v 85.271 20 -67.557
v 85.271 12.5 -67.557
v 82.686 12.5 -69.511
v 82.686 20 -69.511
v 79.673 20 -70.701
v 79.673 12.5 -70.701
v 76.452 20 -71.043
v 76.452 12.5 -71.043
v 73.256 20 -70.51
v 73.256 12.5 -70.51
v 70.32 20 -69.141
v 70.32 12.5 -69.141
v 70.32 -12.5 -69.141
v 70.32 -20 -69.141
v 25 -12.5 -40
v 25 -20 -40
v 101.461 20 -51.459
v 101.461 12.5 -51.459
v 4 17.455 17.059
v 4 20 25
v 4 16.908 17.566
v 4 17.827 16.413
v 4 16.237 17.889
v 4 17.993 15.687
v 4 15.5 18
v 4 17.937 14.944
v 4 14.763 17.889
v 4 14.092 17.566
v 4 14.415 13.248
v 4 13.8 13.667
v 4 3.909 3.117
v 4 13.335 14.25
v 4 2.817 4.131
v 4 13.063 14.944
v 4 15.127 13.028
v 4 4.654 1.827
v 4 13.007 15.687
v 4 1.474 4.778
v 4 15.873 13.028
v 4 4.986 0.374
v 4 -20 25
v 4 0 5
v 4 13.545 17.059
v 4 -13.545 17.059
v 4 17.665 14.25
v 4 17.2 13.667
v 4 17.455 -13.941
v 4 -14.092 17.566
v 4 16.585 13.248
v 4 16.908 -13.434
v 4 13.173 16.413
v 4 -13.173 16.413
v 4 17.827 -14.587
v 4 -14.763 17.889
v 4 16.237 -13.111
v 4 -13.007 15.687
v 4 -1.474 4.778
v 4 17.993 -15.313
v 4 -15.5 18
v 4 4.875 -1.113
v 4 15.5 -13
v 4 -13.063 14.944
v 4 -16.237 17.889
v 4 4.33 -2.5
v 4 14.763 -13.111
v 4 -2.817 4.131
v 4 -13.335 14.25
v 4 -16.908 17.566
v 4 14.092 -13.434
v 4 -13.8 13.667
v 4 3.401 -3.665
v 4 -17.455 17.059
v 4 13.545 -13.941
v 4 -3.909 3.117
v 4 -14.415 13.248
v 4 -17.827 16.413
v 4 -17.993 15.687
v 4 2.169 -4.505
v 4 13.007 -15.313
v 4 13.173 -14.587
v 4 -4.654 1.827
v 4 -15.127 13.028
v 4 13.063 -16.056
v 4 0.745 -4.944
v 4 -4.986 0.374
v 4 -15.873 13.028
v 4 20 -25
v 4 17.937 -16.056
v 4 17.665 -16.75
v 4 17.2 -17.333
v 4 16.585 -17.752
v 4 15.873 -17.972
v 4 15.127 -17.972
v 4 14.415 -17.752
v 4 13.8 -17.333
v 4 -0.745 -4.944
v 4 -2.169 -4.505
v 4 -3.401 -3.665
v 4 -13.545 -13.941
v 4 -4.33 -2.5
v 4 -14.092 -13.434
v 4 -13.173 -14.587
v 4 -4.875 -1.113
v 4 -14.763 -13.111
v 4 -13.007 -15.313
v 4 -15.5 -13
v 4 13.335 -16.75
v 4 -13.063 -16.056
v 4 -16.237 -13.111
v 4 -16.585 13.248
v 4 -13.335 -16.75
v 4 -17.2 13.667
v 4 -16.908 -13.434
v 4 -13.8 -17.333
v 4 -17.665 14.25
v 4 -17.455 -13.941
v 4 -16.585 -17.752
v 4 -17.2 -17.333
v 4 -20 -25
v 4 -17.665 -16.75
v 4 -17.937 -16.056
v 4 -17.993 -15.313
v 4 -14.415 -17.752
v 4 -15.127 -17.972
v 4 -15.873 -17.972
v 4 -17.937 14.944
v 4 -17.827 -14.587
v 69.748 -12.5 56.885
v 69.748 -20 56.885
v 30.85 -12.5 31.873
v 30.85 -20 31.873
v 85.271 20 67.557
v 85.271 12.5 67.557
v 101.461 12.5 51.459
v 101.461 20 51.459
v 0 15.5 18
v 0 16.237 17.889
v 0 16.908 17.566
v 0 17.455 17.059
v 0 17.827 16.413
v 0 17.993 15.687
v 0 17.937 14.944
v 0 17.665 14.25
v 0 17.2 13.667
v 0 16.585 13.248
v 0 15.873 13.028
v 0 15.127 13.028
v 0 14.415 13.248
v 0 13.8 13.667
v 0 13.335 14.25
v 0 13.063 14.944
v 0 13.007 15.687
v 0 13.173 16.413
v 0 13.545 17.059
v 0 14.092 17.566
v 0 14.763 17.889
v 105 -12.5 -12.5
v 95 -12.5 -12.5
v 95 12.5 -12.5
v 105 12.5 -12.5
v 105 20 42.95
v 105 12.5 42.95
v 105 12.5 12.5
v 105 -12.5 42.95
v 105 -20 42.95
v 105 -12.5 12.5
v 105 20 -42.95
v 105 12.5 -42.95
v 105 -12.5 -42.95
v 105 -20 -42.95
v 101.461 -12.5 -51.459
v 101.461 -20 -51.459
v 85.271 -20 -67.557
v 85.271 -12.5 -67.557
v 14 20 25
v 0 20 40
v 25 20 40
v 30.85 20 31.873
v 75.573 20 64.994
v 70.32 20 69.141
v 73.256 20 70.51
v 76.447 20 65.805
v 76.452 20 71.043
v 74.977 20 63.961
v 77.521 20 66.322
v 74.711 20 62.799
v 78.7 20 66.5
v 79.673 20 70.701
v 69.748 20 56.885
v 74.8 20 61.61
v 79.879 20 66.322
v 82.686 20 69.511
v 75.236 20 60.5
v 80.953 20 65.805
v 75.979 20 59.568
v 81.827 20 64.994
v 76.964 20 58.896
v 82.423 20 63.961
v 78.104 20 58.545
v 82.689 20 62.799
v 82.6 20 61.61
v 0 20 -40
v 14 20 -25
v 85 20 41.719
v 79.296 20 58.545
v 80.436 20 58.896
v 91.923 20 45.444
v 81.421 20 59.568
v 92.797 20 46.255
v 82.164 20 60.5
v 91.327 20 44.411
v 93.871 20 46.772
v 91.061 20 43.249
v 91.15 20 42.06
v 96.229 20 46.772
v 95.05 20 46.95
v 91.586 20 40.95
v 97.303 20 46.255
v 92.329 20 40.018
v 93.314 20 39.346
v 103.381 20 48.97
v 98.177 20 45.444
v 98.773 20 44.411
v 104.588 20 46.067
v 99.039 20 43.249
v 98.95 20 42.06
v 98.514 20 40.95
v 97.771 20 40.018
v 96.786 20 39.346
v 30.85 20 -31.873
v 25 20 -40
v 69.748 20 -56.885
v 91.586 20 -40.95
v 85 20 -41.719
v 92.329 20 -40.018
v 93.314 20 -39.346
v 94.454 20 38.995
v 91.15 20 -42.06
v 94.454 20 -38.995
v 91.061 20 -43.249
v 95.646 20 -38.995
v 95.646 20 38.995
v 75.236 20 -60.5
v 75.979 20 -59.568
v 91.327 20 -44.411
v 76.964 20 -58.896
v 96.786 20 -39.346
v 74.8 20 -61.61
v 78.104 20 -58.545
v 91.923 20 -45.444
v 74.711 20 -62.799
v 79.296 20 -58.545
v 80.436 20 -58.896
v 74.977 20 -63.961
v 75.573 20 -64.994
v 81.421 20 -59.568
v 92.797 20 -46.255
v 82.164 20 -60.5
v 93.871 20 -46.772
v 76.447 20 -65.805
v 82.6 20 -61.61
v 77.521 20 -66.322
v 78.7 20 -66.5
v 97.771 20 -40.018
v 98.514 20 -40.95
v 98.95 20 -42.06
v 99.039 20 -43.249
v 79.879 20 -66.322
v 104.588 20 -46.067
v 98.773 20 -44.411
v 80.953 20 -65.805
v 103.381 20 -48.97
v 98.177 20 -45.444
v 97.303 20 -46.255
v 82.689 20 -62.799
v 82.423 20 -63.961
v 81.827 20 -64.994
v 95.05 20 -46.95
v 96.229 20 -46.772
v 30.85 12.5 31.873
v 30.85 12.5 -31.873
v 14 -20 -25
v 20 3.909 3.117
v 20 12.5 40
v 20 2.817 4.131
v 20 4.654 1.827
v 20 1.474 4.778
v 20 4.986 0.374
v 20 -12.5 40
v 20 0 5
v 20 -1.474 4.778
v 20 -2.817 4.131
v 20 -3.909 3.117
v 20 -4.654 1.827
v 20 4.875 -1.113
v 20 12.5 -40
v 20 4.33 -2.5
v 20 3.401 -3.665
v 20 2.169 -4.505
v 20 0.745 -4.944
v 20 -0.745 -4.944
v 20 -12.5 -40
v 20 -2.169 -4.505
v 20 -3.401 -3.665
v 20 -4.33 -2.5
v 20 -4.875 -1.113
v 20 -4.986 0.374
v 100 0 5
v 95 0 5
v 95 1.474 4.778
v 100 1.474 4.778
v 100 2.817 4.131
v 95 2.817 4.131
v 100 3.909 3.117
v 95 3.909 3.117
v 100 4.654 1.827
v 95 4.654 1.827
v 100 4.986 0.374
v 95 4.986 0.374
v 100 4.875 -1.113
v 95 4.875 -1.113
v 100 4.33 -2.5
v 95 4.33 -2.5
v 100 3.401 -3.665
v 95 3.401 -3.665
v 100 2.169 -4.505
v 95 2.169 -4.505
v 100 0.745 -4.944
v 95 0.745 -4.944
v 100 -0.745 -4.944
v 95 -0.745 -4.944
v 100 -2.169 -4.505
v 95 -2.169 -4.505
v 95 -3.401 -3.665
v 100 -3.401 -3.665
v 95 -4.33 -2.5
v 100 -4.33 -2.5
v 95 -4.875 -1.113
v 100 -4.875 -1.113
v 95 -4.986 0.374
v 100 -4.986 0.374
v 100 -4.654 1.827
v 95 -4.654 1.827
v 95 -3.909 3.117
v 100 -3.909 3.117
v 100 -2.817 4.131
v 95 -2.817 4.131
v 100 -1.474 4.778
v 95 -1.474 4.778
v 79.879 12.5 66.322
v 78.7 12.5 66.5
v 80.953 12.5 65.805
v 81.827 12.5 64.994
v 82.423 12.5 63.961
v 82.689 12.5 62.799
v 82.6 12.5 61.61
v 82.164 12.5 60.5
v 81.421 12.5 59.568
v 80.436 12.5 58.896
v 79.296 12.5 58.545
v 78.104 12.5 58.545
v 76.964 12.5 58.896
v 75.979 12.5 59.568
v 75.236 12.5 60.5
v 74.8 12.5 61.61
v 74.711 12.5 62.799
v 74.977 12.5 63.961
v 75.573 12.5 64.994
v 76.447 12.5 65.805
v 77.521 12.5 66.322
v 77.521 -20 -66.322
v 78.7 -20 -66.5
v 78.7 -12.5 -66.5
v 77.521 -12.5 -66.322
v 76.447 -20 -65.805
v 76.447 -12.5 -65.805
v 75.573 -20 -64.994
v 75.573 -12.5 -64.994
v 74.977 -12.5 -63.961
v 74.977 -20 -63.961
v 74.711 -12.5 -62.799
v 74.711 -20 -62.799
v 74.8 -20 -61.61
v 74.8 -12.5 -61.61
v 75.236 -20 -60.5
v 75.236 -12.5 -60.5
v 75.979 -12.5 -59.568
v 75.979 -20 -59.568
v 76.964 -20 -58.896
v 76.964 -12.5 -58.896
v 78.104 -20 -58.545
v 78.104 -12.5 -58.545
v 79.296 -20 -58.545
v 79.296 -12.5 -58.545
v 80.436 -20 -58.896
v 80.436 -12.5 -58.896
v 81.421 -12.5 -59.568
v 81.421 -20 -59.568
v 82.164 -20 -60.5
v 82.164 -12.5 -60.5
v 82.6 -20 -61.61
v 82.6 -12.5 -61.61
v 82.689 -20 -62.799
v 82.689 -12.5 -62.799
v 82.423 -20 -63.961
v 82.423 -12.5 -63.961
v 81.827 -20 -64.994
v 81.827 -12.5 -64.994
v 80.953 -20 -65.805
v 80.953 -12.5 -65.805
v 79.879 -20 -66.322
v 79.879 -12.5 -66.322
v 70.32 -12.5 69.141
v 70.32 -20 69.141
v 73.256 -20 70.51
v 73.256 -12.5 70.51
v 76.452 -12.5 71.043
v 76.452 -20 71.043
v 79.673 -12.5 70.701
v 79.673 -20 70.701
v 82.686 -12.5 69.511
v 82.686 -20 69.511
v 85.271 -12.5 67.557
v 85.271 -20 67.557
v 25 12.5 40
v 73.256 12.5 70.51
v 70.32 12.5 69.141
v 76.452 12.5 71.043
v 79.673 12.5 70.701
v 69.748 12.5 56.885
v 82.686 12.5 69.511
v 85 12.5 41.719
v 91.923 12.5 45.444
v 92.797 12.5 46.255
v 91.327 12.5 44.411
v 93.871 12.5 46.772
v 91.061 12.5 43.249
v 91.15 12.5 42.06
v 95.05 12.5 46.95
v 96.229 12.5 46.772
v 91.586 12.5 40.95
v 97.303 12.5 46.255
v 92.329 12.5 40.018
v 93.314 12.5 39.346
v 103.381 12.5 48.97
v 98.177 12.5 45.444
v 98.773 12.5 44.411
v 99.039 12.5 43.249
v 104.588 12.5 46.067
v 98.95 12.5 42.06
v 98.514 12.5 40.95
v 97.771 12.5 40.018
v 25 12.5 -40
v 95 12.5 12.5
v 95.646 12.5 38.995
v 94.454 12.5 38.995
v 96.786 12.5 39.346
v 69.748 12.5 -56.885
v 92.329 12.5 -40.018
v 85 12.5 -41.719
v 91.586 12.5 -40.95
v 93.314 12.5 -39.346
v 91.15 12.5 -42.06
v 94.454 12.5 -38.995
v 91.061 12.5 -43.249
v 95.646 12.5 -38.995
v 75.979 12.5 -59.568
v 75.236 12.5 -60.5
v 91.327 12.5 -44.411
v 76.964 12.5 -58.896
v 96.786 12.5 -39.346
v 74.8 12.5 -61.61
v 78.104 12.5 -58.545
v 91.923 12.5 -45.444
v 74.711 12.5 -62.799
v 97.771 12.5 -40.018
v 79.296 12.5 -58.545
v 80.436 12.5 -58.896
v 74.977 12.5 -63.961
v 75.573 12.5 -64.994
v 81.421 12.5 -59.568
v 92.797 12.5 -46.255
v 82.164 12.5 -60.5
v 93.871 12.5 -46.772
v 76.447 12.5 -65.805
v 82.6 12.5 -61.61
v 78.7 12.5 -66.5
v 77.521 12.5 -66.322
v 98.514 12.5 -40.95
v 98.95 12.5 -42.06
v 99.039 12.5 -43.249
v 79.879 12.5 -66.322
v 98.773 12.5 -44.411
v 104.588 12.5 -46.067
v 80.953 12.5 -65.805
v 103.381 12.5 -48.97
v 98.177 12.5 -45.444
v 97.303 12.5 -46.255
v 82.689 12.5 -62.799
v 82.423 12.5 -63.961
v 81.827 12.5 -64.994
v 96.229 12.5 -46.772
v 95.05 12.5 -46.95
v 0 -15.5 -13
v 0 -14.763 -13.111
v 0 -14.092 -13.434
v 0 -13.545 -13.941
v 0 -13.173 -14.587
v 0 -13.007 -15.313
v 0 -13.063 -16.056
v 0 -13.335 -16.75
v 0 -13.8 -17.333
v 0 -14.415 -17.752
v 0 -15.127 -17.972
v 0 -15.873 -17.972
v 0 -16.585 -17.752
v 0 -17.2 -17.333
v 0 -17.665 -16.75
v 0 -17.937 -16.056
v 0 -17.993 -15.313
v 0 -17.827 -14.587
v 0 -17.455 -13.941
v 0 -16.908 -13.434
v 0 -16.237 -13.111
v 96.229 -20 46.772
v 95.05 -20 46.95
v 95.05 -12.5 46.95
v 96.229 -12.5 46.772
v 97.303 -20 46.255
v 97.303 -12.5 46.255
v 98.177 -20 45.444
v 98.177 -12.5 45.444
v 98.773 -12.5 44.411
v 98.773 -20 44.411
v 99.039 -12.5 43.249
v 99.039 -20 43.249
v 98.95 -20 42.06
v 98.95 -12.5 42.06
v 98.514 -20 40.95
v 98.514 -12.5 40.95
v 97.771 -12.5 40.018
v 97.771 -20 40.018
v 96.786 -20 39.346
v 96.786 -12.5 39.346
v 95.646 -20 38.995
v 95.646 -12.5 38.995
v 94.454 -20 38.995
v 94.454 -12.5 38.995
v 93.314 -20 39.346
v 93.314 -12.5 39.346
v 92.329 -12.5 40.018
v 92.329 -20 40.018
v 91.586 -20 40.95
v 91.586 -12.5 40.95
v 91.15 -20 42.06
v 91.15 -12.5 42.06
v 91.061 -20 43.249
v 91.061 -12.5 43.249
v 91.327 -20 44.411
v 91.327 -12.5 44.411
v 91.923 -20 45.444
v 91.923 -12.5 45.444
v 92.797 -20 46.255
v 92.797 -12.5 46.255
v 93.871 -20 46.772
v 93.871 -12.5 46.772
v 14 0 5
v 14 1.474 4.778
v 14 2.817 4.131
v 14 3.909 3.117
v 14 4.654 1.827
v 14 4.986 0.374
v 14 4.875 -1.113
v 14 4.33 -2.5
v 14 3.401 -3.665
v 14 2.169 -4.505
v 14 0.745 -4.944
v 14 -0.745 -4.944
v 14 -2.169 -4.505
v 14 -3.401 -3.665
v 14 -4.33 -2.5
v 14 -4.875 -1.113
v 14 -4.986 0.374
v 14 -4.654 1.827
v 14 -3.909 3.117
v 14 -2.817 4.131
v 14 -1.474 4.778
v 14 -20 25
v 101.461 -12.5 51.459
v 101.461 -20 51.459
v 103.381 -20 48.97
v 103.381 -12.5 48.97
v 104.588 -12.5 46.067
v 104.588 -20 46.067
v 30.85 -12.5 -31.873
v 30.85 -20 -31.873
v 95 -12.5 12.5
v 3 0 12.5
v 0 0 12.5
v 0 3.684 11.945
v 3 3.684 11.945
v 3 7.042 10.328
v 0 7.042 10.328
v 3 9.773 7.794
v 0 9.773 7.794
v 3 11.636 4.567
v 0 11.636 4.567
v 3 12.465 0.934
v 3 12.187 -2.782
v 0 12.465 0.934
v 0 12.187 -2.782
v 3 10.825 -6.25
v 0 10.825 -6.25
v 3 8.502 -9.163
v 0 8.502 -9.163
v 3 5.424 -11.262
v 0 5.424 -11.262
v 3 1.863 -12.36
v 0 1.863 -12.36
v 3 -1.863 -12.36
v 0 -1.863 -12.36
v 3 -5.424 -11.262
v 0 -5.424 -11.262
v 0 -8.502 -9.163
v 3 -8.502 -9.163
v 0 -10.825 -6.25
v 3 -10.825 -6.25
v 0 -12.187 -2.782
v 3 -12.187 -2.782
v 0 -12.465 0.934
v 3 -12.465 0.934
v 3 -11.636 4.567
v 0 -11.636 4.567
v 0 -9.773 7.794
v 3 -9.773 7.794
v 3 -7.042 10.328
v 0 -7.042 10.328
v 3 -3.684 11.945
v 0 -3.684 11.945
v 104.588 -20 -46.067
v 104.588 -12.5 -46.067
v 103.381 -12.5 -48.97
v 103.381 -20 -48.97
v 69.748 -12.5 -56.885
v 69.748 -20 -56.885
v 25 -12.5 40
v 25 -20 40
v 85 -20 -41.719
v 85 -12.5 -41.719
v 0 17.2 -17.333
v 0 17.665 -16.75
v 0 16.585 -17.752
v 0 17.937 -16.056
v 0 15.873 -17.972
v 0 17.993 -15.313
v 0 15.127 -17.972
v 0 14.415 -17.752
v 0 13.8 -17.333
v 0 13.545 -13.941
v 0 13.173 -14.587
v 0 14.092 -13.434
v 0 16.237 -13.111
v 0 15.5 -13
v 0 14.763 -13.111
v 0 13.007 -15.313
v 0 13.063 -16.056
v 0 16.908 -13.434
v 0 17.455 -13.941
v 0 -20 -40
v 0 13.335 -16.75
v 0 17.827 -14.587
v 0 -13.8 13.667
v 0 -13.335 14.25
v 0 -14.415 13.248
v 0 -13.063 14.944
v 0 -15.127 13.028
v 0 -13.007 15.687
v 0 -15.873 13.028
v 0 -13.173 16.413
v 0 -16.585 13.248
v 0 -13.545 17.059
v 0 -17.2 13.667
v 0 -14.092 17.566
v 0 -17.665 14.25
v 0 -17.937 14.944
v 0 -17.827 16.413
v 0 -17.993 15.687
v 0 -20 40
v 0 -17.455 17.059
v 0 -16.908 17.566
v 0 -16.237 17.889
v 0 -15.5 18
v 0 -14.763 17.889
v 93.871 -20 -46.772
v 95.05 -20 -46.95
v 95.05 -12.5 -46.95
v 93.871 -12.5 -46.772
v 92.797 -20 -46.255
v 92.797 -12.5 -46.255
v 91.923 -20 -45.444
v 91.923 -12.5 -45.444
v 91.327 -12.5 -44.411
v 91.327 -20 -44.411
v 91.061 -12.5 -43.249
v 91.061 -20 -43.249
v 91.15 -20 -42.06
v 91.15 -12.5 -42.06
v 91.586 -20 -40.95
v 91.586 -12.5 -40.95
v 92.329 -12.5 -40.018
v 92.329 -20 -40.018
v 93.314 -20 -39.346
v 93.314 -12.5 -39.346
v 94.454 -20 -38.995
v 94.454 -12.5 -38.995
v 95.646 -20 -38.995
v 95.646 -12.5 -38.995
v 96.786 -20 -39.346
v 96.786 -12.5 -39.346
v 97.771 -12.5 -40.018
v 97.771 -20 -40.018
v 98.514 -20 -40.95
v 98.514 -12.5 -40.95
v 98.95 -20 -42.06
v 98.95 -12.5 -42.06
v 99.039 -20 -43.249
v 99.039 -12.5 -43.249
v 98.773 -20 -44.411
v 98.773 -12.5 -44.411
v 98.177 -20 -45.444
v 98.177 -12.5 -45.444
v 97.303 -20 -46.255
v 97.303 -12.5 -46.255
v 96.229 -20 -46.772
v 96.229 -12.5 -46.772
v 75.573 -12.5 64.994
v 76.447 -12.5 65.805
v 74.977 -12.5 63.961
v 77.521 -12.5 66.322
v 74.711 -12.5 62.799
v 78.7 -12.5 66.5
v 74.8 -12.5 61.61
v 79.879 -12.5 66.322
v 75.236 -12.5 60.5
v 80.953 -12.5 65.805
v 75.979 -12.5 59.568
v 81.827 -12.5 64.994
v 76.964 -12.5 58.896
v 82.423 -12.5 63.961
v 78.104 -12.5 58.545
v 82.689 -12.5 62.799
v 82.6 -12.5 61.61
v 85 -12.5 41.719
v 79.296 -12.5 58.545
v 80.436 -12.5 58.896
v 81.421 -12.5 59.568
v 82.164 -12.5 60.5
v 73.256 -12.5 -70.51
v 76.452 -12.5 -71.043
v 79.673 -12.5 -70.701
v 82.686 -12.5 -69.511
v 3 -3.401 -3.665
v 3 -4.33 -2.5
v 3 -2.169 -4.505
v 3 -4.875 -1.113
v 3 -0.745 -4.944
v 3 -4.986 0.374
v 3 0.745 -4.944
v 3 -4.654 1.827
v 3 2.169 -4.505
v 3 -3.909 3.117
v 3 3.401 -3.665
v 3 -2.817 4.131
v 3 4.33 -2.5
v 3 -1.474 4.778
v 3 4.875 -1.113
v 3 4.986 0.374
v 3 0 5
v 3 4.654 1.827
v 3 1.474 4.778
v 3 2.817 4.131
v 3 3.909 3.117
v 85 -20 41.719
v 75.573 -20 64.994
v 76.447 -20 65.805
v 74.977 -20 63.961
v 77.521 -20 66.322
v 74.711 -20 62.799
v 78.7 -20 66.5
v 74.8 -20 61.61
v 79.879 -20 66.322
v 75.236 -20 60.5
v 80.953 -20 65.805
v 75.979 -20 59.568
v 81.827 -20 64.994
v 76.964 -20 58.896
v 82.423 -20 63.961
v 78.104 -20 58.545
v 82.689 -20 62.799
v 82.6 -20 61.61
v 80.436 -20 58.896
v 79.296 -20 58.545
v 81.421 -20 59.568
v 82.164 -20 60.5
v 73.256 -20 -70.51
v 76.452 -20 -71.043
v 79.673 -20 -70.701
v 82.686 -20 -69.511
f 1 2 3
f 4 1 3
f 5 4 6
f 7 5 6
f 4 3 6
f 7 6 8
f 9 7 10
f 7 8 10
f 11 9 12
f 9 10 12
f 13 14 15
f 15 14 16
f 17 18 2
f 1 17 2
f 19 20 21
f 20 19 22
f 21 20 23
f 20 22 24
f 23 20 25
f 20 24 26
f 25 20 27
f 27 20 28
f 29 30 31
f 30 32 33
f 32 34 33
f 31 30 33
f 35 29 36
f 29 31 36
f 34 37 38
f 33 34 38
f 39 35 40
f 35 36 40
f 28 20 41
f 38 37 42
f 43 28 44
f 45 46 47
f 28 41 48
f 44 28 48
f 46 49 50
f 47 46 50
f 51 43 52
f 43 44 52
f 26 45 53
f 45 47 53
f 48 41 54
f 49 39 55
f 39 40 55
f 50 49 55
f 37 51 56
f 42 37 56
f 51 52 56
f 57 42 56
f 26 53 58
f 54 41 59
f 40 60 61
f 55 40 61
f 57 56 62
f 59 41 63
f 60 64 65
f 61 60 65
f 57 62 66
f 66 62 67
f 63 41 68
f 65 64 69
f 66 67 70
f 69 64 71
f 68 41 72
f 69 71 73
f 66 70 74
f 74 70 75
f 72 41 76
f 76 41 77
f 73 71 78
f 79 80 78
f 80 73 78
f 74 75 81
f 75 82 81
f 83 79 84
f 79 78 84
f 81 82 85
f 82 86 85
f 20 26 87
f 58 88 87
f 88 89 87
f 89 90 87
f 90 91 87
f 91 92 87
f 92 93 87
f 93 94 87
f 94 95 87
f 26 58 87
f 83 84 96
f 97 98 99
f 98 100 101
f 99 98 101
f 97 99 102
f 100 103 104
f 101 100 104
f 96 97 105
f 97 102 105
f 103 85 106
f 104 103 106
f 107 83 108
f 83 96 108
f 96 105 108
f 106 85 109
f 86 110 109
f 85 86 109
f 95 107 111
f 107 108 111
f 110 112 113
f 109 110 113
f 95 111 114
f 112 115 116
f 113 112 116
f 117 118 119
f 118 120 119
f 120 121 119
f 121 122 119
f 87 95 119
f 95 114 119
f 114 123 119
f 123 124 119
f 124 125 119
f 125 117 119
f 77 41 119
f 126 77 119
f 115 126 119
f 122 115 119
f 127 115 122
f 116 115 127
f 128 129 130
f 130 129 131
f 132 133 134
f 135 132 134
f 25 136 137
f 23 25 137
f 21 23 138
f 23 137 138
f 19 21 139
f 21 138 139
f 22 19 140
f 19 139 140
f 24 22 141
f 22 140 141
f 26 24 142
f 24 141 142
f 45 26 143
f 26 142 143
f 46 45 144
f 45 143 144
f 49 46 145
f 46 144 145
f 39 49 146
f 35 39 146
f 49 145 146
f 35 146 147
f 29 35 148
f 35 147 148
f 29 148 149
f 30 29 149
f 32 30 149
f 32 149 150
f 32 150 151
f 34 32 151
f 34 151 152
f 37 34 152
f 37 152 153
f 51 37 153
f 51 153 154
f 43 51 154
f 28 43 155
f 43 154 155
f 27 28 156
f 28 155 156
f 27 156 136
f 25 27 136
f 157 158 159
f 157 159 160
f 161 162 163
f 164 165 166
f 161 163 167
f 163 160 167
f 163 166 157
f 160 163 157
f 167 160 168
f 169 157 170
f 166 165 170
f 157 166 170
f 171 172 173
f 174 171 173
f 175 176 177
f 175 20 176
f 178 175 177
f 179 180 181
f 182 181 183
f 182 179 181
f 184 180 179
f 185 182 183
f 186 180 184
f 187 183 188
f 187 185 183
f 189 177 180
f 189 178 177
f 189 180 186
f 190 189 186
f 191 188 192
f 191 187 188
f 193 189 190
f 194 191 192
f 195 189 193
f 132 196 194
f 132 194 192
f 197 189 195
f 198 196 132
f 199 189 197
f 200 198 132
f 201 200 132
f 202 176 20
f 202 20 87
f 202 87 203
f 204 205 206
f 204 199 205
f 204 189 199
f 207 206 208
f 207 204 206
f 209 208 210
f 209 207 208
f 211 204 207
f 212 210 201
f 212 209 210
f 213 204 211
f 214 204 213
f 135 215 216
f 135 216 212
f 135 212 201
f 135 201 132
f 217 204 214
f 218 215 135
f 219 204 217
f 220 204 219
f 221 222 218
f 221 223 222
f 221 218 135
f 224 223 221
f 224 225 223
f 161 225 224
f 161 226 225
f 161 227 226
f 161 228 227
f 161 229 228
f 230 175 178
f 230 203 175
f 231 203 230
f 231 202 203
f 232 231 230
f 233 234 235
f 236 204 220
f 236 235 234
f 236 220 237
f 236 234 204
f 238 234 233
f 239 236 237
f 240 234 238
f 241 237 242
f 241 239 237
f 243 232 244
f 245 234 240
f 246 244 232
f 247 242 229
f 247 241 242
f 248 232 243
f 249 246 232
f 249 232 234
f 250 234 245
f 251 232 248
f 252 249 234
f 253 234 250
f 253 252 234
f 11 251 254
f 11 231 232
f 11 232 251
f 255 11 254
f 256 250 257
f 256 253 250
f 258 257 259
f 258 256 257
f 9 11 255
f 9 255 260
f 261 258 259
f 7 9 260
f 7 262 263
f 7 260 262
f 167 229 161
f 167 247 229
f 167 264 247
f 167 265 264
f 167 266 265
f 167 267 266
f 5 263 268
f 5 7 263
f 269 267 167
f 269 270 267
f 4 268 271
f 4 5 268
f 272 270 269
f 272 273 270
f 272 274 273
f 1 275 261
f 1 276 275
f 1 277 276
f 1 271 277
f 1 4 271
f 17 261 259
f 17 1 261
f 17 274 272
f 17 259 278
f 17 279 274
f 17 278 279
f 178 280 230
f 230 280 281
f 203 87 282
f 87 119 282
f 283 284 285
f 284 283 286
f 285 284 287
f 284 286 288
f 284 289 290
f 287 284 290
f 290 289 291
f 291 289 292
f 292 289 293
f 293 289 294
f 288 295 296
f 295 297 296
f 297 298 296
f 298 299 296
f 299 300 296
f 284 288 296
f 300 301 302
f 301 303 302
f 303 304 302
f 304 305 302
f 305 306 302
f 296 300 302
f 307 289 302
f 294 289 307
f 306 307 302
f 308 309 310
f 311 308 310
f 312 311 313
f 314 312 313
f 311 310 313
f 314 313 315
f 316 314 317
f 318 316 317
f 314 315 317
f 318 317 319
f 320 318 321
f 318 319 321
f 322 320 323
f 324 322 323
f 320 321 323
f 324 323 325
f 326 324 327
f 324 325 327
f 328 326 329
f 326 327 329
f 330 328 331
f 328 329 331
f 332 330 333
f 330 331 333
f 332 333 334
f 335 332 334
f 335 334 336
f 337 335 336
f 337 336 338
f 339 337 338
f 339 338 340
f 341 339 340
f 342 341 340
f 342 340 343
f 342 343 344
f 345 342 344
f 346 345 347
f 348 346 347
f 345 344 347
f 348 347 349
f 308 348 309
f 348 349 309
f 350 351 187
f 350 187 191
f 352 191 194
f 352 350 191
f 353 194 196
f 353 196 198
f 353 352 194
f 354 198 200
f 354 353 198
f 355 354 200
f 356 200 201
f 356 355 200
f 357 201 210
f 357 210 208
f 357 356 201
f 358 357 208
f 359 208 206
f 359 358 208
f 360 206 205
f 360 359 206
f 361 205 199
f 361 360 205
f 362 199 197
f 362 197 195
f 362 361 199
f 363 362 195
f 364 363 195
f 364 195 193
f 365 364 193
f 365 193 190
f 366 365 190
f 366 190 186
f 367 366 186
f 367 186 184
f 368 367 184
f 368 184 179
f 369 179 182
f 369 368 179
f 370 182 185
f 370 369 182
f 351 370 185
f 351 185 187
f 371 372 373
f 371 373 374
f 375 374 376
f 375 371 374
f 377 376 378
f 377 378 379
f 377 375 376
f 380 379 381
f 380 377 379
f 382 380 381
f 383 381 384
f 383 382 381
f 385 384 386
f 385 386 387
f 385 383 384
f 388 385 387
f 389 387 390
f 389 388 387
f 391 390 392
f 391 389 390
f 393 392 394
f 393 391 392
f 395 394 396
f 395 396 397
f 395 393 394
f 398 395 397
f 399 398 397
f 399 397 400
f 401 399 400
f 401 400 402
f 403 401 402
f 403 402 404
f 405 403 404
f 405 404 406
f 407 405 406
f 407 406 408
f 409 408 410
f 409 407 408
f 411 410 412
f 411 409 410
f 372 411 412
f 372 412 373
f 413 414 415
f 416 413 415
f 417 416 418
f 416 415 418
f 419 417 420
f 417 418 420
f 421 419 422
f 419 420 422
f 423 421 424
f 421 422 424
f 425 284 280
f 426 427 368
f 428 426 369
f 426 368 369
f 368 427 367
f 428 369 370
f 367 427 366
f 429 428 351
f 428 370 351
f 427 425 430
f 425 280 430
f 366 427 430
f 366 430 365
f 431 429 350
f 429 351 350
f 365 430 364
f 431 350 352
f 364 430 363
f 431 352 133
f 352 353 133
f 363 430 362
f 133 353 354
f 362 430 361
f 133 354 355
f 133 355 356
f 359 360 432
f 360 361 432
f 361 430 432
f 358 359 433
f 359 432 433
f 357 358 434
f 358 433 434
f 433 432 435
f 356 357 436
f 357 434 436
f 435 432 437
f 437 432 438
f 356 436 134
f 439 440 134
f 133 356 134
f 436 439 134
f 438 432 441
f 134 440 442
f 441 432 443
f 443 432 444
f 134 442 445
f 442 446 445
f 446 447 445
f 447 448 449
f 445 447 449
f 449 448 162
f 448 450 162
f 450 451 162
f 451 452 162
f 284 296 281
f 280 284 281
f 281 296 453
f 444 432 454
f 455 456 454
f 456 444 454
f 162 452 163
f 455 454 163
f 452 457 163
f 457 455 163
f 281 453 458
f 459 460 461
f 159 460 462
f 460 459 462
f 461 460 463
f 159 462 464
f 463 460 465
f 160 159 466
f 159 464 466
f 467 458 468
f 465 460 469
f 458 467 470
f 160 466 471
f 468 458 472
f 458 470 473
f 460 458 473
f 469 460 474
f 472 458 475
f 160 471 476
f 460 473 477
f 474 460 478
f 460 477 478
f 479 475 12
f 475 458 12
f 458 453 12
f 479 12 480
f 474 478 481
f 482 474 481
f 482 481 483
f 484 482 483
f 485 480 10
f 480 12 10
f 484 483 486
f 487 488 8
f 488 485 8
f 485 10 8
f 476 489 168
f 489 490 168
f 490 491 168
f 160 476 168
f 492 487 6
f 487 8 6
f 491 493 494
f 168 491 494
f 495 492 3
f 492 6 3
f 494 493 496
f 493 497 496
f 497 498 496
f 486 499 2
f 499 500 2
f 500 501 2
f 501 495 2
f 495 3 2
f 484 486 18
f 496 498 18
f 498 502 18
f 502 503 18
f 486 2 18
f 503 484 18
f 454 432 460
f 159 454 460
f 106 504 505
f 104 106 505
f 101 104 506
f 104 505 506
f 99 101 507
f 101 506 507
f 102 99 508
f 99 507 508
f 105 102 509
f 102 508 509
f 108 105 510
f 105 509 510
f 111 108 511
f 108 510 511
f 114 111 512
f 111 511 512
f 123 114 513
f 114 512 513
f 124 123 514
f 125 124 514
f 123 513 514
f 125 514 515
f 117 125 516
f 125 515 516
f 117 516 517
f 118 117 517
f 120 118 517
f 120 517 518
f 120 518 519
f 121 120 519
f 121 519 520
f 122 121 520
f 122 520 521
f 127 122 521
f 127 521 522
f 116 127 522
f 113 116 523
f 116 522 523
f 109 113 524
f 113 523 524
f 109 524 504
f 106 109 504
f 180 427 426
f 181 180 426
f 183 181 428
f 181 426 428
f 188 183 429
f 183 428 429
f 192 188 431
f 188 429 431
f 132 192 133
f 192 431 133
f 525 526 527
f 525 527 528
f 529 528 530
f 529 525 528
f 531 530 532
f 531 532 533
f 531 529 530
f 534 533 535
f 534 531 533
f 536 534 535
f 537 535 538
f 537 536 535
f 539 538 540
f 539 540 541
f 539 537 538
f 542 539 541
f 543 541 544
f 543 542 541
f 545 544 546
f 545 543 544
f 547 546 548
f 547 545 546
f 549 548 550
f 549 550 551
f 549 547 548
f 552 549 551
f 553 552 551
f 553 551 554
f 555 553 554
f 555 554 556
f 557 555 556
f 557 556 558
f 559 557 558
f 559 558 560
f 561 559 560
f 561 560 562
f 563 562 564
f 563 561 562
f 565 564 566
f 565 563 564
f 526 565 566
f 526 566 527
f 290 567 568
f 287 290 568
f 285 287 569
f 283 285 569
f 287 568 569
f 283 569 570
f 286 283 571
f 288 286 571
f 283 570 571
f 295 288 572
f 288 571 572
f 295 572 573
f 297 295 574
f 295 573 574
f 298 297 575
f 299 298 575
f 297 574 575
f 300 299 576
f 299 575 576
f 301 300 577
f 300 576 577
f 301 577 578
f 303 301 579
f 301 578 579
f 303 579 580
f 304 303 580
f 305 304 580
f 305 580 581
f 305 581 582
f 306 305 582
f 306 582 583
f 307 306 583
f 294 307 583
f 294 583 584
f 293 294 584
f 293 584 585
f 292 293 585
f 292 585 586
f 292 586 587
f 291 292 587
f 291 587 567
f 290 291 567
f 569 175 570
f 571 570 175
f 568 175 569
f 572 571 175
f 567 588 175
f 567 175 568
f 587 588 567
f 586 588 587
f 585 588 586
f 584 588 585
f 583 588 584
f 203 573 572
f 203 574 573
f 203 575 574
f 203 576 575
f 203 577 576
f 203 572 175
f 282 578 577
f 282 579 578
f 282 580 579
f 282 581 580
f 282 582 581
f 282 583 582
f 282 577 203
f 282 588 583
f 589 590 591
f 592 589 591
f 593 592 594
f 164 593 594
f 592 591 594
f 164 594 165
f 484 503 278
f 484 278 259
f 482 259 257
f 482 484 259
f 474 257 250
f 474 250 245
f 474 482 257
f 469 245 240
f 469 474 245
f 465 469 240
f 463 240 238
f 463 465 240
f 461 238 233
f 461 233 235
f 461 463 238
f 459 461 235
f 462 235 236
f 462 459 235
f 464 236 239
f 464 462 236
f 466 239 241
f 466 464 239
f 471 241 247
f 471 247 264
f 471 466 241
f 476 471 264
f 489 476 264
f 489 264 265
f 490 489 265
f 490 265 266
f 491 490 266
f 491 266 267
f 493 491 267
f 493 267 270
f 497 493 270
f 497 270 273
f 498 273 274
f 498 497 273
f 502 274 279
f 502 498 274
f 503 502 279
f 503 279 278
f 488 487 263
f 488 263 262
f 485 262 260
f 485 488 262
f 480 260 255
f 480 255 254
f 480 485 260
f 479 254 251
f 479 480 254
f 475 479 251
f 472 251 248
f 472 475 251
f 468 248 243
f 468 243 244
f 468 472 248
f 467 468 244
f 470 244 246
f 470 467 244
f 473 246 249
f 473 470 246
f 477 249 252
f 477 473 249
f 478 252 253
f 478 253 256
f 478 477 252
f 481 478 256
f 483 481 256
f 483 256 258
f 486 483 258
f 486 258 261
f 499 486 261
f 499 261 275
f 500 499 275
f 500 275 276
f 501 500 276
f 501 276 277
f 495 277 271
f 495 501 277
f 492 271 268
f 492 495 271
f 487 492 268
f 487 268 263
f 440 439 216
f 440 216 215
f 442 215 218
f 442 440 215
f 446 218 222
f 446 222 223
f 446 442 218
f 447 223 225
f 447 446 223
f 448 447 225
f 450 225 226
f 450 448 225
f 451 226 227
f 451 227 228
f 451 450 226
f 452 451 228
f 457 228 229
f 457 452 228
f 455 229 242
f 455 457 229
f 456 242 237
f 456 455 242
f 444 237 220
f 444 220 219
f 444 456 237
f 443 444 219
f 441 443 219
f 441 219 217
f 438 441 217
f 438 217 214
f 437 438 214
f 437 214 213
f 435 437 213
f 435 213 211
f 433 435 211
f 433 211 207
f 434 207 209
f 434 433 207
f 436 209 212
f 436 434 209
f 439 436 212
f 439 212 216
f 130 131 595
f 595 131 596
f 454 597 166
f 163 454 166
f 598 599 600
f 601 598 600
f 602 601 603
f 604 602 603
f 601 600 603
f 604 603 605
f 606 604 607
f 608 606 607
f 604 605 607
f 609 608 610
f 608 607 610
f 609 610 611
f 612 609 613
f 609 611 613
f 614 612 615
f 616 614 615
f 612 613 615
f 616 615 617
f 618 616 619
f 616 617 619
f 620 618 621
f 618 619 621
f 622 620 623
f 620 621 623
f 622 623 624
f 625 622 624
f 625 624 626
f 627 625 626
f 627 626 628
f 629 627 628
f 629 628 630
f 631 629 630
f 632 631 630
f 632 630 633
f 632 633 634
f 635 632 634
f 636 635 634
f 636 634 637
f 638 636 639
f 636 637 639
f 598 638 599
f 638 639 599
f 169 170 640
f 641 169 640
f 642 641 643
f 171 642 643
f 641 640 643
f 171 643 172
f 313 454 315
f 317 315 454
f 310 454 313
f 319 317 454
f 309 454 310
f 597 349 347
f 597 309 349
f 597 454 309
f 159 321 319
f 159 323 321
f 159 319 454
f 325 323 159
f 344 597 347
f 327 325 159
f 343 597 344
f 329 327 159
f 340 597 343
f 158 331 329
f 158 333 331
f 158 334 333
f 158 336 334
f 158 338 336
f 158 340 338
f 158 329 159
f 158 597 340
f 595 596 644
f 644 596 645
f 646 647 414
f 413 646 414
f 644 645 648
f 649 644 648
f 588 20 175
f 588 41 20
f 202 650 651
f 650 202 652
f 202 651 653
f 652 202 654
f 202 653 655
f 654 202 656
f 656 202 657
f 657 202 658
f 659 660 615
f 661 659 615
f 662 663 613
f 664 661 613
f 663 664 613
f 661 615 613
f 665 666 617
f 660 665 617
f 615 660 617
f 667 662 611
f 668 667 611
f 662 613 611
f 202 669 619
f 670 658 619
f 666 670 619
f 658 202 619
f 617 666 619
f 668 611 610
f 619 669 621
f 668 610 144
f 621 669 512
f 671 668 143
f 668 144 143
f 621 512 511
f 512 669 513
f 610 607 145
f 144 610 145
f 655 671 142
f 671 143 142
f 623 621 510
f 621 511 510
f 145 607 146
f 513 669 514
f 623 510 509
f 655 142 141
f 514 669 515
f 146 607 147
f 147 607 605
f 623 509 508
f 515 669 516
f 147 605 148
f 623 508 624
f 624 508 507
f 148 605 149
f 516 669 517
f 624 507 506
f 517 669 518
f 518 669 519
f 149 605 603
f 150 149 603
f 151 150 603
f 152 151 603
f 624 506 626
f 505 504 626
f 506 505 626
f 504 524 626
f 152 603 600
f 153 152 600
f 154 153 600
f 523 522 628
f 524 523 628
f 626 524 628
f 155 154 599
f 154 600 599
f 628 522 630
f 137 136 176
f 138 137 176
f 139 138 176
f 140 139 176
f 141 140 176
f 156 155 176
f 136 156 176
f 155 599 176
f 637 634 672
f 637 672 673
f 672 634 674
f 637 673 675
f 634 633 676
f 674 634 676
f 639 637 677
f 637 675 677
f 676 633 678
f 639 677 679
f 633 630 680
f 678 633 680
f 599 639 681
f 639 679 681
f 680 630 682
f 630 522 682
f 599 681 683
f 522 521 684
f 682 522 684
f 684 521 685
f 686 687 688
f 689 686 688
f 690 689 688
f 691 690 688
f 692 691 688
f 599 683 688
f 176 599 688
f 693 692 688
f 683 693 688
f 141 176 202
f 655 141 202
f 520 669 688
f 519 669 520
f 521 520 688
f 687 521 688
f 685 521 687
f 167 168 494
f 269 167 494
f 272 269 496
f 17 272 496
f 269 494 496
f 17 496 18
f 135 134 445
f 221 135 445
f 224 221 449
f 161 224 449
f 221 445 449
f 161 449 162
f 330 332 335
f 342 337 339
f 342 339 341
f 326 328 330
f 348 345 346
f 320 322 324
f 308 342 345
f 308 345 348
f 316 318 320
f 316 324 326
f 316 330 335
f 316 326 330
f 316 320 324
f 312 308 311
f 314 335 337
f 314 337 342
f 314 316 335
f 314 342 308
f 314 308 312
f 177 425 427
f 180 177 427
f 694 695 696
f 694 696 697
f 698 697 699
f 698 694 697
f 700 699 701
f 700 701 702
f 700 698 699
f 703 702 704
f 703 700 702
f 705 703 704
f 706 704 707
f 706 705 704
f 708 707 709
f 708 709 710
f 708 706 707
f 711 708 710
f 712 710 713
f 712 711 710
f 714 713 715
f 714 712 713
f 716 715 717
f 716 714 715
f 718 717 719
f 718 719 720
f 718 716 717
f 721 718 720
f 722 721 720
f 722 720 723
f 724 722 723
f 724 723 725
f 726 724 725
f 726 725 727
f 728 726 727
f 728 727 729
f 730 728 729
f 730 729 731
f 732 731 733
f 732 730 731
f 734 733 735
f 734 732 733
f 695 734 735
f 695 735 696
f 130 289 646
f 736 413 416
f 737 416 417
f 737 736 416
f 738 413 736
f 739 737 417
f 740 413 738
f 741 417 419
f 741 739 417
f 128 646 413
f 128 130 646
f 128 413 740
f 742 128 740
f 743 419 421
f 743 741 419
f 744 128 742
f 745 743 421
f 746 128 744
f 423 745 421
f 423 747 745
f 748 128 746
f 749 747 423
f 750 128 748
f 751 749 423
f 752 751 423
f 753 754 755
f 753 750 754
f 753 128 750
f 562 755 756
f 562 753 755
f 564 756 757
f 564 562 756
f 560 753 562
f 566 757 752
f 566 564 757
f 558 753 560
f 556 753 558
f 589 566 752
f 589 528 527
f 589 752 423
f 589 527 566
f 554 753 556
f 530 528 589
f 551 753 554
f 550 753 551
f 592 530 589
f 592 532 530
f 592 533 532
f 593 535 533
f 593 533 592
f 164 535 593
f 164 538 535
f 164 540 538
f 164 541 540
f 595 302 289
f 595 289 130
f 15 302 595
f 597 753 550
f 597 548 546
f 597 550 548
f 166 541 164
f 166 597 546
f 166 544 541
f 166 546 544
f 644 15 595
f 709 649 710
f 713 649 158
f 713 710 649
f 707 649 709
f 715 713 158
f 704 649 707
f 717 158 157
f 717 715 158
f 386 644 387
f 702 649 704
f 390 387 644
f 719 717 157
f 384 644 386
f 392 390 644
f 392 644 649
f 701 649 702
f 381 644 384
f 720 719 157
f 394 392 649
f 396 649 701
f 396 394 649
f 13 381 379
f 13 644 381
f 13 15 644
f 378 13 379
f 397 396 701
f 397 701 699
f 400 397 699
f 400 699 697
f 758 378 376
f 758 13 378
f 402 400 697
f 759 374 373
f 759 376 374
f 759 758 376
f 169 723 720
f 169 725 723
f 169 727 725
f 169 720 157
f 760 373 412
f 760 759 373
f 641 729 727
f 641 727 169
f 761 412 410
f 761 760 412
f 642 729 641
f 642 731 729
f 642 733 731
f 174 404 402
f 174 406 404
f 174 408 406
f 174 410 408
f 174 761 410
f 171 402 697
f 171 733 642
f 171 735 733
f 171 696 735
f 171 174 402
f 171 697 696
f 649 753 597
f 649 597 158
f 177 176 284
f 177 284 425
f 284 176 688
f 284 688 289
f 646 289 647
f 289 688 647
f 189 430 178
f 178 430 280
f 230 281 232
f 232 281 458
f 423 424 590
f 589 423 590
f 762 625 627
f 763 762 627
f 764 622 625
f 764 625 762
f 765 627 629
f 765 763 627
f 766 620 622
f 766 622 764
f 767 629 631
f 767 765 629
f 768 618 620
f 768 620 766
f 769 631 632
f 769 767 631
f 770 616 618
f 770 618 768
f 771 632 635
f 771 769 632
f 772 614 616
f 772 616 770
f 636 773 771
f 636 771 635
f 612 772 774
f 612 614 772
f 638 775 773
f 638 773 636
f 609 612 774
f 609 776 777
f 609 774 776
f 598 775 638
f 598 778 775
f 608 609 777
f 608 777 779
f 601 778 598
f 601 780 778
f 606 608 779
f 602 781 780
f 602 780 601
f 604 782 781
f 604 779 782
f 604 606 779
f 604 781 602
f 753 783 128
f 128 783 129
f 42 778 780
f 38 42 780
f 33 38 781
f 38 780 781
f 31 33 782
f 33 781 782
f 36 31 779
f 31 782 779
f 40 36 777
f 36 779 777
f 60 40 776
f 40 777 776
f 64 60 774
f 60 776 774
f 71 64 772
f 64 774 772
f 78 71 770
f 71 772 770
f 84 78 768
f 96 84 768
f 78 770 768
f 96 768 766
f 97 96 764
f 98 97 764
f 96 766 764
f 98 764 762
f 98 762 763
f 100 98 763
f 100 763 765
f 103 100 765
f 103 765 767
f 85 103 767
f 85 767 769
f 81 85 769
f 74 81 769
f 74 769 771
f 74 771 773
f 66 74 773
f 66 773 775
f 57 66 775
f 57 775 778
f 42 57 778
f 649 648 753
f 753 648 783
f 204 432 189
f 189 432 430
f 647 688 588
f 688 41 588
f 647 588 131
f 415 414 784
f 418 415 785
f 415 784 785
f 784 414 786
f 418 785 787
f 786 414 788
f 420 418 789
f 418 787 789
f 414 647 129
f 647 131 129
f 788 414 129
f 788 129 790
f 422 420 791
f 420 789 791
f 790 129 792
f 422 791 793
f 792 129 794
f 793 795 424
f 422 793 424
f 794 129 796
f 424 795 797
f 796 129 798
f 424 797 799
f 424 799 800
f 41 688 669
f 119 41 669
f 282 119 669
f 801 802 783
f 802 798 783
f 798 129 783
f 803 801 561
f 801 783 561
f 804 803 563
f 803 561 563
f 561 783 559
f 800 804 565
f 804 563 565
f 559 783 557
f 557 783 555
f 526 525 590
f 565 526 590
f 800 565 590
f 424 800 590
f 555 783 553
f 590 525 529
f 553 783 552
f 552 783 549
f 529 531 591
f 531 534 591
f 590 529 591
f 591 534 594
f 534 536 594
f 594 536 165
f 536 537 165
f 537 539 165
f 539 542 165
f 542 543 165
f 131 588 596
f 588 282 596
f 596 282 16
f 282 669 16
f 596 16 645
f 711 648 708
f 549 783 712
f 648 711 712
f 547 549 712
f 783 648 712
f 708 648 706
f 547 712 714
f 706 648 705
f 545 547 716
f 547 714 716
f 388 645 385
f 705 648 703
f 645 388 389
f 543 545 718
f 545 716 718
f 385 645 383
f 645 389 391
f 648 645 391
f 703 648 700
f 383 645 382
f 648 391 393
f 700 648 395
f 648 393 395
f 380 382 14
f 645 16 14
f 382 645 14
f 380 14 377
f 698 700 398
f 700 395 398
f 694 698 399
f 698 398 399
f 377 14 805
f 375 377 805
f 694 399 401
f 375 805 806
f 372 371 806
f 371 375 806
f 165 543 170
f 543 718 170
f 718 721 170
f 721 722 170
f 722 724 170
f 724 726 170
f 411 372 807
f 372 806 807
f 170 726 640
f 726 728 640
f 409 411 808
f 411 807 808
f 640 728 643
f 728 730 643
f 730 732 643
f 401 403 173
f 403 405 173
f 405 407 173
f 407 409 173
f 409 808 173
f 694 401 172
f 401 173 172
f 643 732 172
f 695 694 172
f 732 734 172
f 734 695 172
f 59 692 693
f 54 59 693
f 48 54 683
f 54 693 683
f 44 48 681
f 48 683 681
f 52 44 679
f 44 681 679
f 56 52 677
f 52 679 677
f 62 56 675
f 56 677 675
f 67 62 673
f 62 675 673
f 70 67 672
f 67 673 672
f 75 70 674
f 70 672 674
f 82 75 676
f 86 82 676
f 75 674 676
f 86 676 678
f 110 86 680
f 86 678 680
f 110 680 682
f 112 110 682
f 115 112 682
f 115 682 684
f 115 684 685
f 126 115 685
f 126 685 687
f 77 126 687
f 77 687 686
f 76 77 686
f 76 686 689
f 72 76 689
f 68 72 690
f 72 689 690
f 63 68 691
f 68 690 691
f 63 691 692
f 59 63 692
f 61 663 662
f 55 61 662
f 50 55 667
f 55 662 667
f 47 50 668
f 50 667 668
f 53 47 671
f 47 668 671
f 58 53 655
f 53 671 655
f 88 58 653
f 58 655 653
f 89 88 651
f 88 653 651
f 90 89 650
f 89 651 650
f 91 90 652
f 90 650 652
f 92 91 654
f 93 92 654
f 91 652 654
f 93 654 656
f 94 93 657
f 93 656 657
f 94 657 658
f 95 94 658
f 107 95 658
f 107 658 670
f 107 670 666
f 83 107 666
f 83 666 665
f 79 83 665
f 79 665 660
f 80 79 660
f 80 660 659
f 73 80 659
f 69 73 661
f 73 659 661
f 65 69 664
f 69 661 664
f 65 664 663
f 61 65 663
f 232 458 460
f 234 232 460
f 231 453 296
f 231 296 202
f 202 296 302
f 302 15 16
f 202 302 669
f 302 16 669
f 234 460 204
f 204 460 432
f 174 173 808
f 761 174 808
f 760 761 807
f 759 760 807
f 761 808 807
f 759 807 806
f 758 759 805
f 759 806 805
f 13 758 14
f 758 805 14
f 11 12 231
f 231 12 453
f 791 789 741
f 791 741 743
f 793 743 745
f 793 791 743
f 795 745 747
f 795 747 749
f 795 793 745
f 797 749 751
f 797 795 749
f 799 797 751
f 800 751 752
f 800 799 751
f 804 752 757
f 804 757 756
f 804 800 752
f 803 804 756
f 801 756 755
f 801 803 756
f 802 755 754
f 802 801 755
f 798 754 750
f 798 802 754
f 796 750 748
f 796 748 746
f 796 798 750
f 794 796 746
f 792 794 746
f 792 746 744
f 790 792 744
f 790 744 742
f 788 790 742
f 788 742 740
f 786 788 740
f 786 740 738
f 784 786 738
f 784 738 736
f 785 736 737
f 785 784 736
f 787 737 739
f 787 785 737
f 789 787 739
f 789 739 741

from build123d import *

# Parameters (mm, degrees)
SKETCH1_R           = 4
SKETCH1_W           = 10
SKETCH1_H           = 50
BOSS_EXTRUDE1_DEPTH = 7.5
SKETCH3_W           = 10
SKETCH3_H           = 25
SKETCH3_W_2         = 20
SKETCH3_H_2         = 80
SKETCH3_H_3         = 50
BOSS_EXTRUDE2_DEPTH = 25
LPATTERN1_COUNT     = 2
LPATTERN1_PITCH     = 32.5
SKETCH4_R           = 12.5
CUT_EXTRUDE1_DEPTH  = 3
SKETCH4_3_R         = 5
CUT_EXTRUDE2_DEPTH  = 40
SKETCH4_4_R         = 2.5
CUT_EXTRUDE3_DEPTH  = 4
SKETCH5_R           = 5
CUT_EXTRUDE4_DEPTH  = 5


with BuildPart() as part:
    # Sketch1 → Boss-Extrude1 (new body)
    with BuildSketch(Plane(origin=(0, -20, 0), x_dir=(1, 0, 0), z_dir=(0, 1, 0))):
        with BuildLine():
            Line((0, 40), (0, -40))
            Line((0, -40), (25, -40))
            Line((25, -40), (70.319765879, -69.141388534))
            ThreePointArc((70.319765879, -69.141388534), (78.074234717, -70.981200492), (85.271064581, -67.557410938))
            Line((85.271064581, -67.557410938), (101.461064602, -51.459429229))
            ThreePointArc((101.461064602, -51.459429229), (104.079999441, -47.5579944), (105, -42.95))
            Line((105, -42.95), (105, 42.95))
            ThreePointArc((105, 42.95), (104.079999441, 47.5579944), (101.461064602, 51.459429229))
            Line((101.461064602, 51.459429229), (85.271064581, 67.557410938))
            ThreePointArc((85.271064581, 67.557410938), (78.074234717, 70.981200492), (70.319765879, 69.141388534))
            Line((70.319765879, 69.141388534), (25, 40))
            Line((25, 40), (0, 40))
        make_face()
        with Locations((78.7, -62.5)):
            Circle(SKETCH1_R, mode=Mode.SUBTRACT)
        with Locations((95.05, -42.95)):
            Circle(SKETCH1_R, mode=Mode.SUBTRACT)
        with Locations((95.05, 42.95)):
            Circle(SKETCH1_R, mode=Mode.SUBTRACT)
        with Locations((78.7, 62.5)):
            Circle(SKETCH1_R, mode=Mode.SUBTRACT)
        with Locations((9, 0)):
            Rectangle(SKETCH1_W, SKETCH1_H, mode=Mode.SUBTRACT)
        Polygon((30.85, -31.872701463), (30.85, 31.872701463), (69.747715914, 56.88460147), (85, 41.719006045), (85, -41.719006045), (69.747715914, -56.88460147), align=None, mode=Mode.SUBTRACT)
    boss_extrude1 = extrude(amount=BOSS_EXTRUDE1_DEPTH)

    # Sketch3 → Boss-Extrude2 (add)
    # profile 1 of 2: a face of its own
    with BuildSketch(Plane(origin=(0, -12.5, 0), x_dir=(1, 0, 0), z_dir=(0, 1, 0))):
        with Locations((100, 0)):
            Rectangle(SKETCH3_W, SKETCH3_H)
    # profile 2 of 2: a face of its own
    with BuildSketch(Plane(origin=(0, -12.5, 0), x_dir=(1, 0, 0), z_dir=(0, 1, 0))):
        with Locations((10, 0)):
            Rectangle(SKETCH3_W_2, SKETCH3_H_2)
        with Locations((9, 0)):
            Rectangle(SKETCH3_W, SKETCH3_H_3, mode=Mode.SUBTRACT)
    extrude(amount=BOSS_EXTRUDE2_DEPTH)

    # LPattern1: Boss-Extrude1 ×2
    with Locations(*[(0, i * LPATTERN1_PITCH, 0) for i in range(1, LPATTERN1_COUNT)]):
        add(boss_extrude1)

    # Sketch4 → Cut-Extrude1 (cut)
    with BuildSketch(Plane.ZY):
        Circle(SKETCH4_R)
    extrude(amount=-CUT_EXTRUDE1_DEPTH, mode=Mode.SUBTRACT)

    # Sketch4<3> → Cut-Extrude2 (cut)
    with BuildSketch(Plane.ZY):
        Circle(SKETCH4_3_R)
    extrude(amount=-CUT_EXTRUDE2_DEPTH, mode=Mode.SUBTRACT)

    # Sketch4<4> → Cut-Extrude3 (cut)
    with BuildSketch(Plane.ZY):
        with Locations((15.5, 15.5)):
            Circle(SKETCH4_4_R)
        with Locations((-15.5, 15.5)):
            Circle(SKETCH4_4_R)
        with Locations((-15.5, -15.5)):
            Circle(SKETCH4_4_R)
        with Locations((15.5, -15.5)):
            Circle(SKETCH4_4_R)
    extrude(amount=-CUT_EXTRUDE3_DEPTH, mode=Mode.SUBTRACT)

    # Sketch5 → Cut-Extrude4 (cut)
    with BuildSketch(Plane.ZY.offset(-95)):
        Circle(SKETCH5_R)
    extrude(amount=-CUT_EXTRUDE4_DEPTH, mode=Mode.SUBTRACT)


solid = part.part
